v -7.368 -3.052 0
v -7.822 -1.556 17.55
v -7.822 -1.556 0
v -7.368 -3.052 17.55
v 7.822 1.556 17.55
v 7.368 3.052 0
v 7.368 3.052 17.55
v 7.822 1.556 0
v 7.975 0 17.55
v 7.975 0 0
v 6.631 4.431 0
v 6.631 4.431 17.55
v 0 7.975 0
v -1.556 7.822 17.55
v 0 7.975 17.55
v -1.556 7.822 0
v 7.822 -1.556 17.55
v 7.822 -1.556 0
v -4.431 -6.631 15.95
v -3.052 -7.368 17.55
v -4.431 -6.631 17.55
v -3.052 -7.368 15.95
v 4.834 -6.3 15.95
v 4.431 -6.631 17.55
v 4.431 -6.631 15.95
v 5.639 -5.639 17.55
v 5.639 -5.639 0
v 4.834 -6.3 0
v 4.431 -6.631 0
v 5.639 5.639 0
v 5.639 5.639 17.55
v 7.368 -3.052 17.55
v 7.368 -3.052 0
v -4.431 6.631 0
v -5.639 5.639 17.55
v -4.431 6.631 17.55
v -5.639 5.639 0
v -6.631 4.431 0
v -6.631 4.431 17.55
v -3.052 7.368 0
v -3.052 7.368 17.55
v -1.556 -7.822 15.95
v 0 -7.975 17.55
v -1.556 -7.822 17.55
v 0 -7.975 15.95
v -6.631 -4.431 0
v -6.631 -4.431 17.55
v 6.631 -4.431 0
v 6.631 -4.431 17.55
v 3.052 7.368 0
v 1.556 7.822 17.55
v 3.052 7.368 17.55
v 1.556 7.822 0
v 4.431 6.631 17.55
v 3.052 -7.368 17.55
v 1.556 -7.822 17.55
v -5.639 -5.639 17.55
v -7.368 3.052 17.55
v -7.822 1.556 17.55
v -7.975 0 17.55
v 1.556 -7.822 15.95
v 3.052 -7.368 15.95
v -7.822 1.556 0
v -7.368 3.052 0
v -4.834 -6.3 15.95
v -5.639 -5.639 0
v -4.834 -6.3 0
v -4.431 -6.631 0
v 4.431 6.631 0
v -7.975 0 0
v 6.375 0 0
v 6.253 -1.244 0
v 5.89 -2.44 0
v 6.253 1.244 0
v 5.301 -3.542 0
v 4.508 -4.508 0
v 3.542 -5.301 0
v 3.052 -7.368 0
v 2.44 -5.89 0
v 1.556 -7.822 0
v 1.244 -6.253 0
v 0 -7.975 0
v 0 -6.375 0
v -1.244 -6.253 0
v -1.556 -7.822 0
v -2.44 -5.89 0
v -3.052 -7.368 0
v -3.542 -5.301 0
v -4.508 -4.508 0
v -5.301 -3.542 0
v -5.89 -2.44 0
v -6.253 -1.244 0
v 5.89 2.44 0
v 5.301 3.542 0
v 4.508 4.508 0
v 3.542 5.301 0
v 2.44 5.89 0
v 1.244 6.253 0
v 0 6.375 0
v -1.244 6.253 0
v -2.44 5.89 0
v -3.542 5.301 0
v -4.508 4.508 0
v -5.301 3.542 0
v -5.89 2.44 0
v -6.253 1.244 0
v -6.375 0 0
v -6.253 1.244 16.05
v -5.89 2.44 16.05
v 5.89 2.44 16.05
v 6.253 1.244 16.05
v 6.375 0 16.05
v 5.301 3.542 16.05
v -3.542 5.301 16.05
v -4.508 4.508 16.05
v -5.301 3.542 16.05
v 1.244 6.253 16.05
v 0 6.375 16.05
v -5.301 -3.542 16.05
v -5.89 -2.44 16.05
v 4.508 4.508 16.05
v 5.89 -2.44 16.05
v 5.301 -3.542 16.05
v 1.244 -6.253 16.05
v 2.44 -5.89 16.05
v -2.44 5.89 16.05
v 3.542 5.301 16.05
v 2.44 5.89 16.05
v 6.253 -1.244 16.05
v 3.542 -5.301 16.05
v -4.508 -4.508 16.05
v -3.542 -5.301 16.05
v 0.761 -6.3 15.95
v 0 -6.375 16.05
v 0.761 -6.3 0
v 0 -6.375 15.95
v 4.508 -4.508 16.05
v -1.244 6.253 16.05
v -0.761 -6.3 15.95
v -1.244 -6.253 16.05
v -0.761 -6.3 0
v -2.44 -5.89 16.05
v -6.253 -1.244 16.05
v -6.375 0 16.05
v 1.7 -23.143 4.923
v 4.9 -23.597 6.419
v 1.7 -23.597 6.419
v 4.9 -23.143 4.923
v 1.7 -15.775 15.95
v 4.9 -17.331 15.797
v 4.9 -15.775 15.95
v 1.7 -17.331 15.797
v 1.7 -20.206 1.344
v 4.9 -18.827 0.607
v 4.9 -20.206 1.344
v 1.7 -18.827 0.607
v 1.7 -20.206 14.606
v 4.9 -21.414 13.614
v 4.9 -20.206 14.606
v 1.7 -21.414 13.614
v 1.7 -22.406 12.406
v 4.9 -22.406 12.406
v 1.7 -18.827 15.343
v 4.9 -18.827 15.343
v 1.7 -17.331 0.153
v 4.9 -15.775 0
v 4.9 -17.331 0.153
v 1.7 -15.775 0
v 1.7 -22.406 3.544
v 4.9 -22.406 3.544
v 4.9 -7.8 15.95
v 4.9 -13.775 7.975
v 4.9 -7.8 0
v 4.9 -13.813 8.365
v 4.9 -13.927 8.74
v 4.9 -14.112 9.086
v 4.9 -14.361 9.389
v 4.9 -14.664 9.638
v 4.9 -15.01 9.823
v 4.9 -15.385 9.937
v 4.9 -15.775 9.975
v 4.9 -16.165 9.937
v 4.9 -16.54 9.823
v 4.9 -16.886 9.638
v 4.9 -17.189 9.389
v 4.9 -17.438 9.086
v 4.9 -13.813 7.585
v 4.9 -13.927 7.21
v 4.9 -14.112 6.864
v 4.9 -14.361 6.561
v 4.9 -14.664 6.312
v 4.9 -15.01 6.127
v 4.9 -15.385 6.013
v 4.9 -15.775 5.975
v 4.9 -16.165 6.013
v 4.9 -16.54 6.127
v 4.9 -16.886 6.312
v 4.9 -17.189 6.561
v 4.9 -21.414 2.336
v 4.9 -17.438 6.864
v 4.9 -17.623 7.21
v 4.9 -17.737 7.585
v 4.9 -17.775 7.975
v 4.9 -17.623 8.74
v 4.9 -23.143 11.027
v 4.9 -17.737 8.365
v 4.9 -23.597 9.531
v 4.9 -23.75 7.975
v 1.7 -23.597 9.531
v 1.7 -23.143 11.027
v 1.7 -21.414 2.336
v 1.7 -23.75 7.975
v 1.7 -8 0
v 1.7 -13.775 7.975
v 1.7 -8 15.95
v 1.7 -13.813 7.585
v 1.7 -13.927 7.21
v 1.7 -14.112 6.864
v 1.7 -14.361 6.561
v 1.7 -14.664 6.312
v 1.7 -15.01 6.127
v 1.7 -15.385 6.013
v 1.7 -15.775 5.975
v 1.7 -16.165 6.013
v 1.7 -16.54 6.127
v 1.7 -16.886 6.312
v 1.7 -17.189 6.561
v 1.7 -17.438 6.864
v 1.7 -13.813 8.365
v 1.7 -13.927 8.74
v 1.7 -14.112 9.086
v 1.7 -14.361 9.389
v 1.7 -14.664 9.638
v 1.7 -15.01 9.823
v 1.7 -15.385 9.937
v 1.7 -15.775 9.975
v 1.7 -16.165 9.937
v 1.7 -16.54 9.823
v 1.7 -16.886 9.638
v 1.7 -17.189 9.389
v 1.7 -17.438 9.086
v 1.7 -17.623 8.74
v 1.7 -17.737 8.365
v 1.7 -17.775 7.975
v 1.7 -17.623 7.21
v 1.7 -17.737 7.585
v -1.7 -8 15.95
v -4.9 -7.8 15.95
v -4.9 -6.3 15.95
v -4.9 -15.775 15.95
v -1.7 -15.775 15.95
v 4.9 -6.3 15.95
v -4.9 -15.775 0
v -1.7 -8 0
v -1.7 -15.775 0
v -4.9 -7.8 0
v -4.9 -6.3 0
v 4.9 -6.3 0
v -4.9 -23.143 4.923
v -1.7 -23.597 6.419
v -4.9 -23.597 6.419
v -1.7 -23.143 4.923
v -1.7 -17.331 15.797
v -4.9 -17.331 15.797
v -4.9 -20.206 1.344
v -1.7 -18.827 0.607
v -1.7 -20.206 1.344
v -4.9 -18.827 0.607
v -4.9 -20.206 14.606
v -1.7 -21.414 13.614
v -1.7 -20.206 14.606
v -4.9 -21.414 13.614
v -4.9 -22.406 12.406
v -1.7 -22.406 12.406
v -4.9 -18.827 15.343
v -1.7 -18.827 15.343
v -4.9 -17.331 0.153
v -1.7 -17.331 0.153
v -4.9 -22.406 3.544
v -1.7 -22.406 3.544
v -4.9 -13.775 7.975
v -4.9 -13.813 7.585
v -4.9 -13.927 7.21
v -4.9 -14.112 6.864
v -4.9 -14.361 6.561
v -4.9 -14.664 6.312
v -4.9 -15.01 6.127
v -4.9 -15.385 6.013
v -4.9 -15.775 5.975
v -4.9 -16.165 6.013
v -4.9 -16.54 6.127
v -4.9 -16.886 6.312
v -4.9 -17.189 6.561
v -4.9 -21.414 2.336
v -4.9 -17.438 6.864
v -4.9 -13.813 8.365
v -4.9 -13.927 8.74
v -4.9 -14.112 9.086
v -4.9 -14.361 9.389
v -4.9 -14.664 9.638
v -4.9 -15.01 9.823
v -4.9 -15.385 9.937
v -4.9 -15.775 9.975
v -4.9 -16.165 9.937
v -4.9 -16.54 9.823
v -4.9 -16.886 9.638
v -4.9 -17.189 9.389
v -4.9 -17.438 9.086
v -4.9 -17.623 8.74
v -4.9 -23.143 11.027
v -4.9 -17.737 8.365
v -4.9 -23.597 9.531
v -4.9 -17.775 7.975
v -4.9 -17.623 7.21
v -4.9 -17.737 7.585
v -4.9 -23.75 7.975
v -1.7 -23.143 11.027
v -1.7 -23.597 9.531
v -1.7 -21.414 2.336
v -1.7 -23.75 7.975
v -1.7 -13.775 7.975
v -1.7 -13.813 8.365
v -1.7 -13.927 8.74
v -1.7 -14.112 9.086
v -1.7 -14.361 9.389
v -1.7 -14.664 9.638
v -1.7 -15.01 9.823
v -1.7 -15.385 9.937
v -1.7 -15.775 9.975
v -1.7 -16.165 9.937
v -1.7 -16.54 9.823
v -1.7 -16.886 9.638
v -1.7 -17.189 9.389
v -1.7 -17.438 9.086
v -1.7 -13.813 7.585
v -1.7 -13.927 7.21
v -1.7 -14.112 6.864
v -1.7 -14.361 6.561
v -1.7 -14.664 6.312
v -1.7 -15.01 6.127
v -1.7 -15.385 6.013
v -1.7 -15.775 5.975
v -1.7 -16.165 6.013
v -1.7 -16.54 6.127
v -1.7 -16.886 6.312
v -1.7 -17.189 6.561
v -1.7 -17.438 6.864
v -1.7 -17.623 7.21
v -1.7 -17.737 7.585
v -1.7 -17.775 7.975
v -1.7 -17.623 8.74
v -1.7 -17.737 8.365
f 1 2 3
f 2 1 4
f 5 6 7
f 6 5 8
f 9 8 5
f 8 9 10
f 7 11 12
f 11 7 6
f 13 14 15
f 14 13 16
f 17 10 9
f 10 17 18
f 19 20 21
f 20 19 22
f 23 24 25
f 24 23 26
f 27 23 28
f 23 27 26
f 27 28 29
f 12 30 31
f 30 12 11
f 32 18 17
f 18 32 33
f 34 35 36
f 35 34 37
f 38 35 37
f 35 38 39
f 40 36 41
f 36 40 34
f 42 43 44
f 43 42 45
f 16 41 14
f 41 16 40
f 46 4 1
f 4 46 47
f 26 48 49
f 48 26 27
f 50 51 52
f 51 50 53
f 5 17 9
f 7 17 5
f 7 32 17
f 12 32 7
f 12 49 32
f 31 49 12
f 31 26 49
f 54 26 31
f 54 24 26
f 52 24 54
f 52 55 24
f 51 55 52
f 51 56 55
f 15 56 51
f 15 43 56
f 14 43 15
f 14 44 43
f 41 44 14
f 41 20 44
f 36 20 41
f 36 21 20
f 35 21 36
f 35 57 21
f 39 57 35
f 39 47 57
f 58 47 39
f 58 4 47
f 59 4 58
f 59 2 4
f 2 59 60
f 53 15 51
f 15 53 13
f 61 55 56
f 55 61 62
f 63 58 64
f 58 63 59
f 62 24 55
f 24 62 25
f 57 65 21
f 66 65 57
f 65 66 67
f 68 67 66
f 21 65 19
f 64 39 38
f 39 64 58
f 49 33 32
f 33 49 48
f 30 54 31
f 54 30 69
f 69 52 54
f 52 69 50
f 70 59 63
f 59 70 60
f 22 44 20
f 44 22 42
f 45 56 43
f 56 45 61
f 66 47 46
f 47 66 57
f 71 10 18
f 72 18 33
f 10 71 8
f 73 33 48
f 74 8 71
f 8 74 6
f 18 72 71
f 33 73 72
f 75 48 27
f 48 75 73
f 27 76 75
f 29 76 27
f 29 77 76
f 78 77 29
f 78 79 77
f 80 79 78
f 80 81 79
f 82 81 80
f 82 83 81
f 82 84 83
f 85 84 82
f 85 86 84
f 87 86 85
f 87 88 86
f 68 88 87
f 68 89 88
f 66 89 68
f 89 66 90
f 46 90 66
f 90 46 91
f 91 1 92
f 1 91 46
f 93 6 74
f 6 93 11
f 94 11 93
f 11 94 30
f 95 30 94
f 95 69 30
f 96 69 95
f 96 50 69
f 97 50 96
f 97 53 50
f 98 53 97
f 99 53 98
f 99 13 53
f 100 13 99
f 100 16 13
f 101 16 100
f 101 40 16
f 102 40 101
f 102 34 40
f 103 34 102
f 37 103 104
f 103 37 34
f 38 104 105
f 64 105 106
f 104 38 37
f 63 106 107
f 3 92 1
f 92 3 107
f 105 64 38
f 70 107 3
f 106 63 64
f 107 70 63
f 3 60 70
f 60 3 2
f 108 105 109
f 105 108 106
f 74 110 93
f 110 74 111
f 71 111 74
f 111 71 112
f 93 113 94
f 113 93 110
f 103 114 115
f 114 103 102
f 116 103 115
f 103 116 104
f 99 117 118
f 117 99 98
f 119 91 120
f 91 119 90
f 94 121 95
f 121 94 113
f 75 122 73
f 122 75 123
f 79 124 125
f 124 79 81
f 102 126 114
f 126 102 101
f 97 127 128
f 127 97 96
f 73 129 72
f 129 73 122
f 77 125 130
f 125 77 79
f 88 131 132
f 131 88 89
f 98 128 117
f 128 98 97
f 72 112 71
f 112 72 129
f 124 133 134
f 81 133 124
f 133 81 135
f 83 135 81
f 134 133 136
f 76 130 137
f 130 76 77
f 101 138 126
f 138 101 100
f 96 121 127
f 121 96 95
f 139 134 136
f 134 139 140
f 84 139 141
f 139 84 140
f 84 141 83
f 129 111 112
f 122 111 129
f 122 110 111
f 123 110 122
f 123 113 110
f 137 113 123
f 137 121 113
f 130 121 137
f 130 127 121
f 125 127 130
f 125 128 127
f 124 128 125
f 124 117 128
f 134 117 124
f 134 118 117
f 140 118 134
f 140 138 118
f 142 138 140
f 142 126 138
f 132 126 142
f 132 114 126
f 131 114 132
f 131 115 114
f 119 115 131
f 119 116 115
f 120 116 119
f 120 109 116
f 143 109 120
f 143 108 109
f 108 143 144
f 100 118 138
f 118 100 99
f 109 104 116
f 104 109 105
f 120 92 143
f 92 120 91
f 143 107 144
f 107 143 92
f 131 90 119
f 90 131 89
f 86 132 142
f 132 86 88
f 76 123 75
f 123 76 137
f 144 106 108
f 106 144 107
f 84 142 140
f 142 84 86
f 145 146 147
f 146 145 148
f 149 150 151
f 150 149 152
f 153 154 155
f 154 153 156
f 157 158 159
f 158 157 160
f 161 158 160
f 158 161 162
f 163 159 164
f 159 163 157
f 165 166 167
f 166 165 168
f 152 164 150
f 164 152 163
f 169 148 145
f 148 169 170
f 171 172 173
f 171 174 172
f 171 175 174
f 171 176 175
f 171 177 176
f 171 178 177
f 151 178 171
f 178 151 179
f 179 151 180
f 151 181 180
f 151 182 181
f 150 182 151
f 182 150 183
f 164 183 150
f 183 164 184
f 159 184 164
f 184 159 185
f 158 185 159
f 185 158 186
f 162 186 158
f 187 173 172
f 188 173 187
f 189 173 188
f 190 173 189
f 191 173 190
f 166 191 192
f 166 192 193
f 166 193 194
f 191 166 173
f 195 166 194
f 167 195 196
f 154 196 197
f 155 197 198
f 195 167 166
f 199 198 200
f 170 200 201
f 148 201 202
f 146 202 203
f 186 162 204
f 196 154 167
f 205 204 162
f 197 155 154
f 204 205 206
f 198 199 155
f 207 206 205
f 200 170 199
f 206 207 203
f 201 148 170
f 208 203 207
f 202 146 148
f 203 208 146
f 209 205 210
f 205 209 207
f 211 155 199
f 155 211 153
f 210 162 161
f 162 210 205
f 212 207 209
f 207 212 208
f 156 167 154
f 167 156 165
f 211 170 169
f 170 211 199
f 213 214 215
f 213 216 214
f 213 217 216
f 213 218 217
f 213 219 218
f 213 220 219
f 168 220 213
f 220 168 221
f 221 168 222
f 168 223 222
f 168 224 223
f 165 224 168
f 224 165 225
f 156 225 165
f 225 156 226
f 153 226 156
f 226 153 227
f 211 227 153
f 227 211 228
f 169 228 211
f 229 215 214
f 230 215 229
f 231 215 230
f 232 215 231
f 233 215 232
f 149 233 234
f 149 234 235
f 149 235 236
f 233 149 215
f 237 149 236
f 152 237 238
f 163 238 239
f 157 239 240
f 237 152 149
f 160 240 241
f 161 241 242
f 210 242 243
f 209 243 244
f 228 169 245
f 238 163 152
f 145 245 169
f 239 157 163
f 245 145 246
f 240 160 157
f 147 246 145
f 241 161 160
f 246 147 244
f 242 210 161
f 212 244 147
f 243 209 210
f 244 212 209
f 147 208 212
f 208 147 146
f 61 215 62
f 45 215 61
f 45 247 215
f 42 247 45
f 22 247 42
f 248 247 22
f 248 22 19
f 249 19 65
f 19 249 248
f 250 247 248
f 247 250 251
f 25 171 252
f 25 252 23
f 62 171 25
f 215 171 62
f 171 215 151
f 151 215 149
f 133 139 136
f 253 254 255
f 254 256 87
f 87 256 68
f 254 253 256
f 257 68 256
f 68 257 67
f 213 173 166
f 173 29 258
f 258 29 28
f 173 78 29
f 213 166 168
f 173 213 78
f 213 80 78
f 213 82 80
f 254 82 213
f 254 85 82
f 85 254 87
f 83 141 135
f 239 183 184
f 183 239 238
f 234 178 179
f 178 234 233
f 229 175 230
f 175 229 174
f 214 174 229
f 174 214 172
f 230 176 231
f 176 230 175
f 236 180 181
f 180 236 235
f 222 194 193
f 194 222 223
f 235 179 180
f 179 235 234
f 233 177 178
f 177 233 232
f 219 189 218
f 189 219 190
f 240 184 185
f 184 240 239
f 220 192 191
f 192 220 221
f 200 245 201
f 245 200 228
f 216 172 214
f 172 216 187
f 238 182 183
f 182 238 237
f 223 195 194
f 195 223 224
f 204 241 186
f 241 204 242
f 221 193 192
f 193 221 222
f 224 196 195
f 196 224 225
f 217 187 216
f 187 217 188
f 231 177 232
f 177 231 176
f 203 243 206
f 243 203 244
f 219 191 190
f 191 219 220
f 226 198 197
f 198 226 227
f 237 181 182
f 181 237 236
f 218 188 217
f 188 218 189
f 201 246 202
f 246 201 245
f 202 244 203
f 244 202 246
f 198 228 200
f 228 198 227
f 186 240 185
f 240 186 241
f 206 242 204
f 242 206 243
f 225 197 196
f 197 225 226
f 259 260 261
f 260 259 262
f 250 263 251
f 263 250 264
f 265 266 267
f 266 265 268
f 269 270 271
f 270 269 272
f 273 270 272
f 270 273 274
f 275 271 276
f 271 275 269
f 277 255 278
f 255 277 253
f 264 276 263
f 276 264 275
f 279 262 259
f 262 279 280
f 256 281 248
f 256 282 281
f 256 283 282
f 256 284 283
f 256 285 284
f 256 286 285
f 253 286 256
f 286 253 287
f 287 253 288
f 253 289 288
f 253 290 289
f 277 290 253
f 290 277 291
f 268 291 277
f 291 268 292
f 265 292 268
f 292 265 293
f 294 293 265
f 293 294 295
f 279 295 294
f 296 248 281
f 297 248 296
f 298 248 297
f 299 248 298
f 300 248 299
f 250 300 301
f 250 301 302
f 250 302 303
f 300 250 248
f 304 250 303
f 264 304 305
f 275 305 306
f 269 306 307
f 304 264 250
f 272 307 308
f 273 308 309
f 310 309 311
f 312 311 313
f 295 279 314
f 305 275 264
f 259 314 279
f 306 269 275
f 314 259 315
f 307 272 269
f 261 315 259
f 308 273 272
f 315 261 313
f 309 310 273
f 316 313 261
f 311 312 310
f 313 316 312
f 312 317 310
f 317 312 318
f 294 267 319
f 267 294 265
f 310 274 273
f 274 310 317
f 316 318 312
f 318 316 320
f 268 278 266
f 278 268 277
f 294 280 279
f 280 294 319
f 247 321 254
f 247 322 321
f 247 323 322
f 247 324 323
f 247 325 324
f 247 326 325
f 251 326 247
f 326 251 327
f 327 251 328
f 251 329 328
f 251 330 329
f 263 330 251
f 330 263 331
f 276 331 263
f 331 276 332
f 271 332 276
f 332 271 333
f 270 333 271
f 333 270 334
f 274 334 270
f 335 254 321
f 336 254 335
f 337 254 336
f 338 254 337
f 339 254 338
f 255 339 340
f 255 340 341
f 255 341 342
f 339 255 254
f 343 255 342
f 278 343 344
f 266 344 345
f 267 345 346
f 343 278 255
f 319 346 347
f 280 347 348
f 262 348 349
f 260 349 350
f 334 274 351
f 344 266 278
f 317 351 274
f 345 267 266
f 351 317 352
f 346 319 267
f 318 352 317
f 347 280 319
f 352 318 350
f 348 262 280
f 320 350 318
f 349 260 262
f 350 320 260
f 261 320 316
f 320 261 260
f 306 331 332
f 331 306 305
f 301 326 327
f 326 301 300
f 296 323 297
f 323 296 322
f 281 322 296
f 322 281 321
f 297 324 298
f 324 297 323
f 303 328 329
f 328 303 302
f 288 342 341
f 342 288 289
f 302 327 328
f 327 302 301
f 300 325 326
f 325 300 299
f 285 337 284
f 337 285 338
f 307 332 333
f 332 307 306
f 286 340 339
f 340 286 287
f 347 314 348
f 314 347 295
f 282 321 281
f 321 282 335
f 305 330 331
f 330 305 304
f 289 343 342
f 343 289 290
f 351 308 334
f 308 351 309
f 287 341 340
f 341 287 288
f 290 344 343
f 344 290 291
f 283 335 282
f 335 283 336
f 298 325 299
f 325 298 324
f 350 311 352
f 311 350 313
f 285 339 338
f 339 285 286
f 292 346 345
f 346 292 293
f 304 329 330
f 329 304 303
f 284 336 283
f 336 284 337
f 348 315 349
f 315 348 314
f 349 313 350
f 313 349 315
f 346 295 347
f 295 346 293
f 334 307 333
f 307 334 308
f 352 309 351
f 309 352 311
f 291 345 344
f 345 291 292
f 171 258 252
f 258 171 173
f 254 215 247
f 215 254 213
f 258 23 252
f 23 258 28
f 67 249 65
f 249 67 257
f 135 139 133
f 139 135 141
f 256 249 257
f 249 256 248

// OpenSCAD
r=6.375;
$fn=32;

or=r+1.6;

finT=1.6*2;

// singleSide();
doubleSide(true);
// doubleFortyFive();
// singleFortyFive();
// halfSide();
// halfCap();
// singleCap();
// doubleCap();
// doubleSingle();
// passthru(true);
// doublePassthru();

module doublePassthru() {
passthru(true);
translate([0,0,-80]) passthru(false);
translate([0,0,-70]) difference() {
  cylinder(r=r+1.6,h=70);
  translate([0,0,-0.1]) cylinder(r=r,h=80.2); 
}
}

module passthru(capped=false,extra=0) {
  difference() {
    ch = capped ? or*2+1.6 : or*2;
    union() {
      cylinder(r=r+1.6,h=ch+extra);
      translate([0,or,or+extra]) rotate([90,0,0]) cylinder(r=or,h=or*2);
    }
    translate([0,0,-0.1]) cylinder(r=r,h=or*2+0.2+extra);
    translate([0,or+1,or+extra]) rotate([90,0,0])  cylinder(r=2,h=or*2+2);
  }
}

module doubleSingle() {
singleSide(true);
translate([0,0,-80]) singleSide(false);
translate([0,0,-80]) difference() {
  cylinder(r=r+1.6,h=80);
  translate([0,0,-0.1]) cylinder(r=r,h=80.2); 
}
}

module singleFortyFive() {
  difference() {
    union() {
      cylinder(r=r+1.6,h=or*3+1.6);
      translate([0,3.8,or*2-2]) rotate([45,0,0]) translate([0,0,5]) fin(8);
    }
    translate([0,0,-0.1]) cylinder(r=r,h=or*3+0.1);
  }
}

module doubleFortyFive() {
  difference() {
    union() {
      cylinder(r=r+1.6,h=or*3+1.6);

      translate([0,3.8,or*2-2]) rotate([45,0,0]) translate([0,0,5]) union() {
        translate([finT+0.1,0,0]) fin(11);
        mirror([1,0,0]) translate([finT+0.1,0,0]) fin(11);
        translate([-(finT*3+0.2)/2,-or,0]) cube([finT*3+0.2,or*2,10]);
      }
    }
    translate([0,0,-0.1]) cylinder(r=r,h=or*3+0.1);
  }
}


module singleSide(capped=false) {
  difference() {
    ch = capped ? or*2+1.6 : or*2;
    cylinder(r=r+1.6,h=ch);
    translate([0,0,-0.1]) cylinder(r=r,h=or*2+0.2);
  }

  translate([0,3.8,or]) rotate([90,0,0]) fin();
}

module doubleSide(capped=false) {
  difference() {
    ch = capped ? or*2+1.6 : or*2;
    cylinder(r=r+1.6,h=ch);
    translate([0,0,-0.1]) cylinder(r=r,h=or*2+0.2);
  }
   translate([0,3.8,or]) rotate([90,0,0]) union() {
      translate([finT+0.1,0,0]) fin();
      mirror([1,0,0]) translate([finT+0.1,0,0]) fin();
      translate([-(finT*3+0.2)/2,-or,10.1]) cube([finT*3+0.2,or*2,1.7]);
    }
}


module halfCap() {
    difference() {
    cylinder(r=r+1.6,h=11.6);
    translate([0,0,-0.1]) cylinder(r=r,h=10.2);
  }

      translate([finT/2,0,0]) fin();
      translate([finT+finT/2,0,0]) fin();
      translate([finT+finT/2+1.6,0,0]) fin();
}

module halfSide() {
  difference() {
    union() {
      cylinder(r=r+1.6,h=or*2);
      translate([0,7,or]) rotate([90,0,0]) { 
        translate([finT/2,0,0]) fin();
        translate([finT+finT/2,0,0]) fin();
        translate([finT+finT/2+1.6,0,0]) fin(4.6);
      }
    }
    translate([0,0,-0.1]) cylinder(r=r,h=or*2+0.2);
  }

   
}




module singleCap() {

  difference() {
    cylinder(r=r+1.6,h=21.6);
    translate([0,0,-0.1]) cylinder(r=r,h=20.2);
  }
  translate([0,0,10]) intersection() {
    fin();
    cylinder(r=or,h=100);
  }
}
module doubleCap() {

  difference() {
    cylinder(r=r+1.6,h=21.6);
    translate([0,0,-0.1]) cylinder(r=r,h=20.2);
  }
  translate([0,0,10]) intersection() {
    union() {
      translate([finT+0.1,0,0]) fin();
      mirror([1,0,0]) translate([finT+0.1,0,0]) fin();
    }
    cylinder(r=or,h=100);
  }
}

module fin(extra=0) {
  translate([0,0,or+11.6]) rotate([0,90,0]) {
    translate([0,0,-finT/2]) difference() {
    union() {
      cylinder(r=or,h=finT);
      translate([0,-or,0]) cube([r+1.6+extra,or*2,finT]);
    }
      translate([0,0,-4]) cylinder(r=2,h=10);

    }
  }
}
